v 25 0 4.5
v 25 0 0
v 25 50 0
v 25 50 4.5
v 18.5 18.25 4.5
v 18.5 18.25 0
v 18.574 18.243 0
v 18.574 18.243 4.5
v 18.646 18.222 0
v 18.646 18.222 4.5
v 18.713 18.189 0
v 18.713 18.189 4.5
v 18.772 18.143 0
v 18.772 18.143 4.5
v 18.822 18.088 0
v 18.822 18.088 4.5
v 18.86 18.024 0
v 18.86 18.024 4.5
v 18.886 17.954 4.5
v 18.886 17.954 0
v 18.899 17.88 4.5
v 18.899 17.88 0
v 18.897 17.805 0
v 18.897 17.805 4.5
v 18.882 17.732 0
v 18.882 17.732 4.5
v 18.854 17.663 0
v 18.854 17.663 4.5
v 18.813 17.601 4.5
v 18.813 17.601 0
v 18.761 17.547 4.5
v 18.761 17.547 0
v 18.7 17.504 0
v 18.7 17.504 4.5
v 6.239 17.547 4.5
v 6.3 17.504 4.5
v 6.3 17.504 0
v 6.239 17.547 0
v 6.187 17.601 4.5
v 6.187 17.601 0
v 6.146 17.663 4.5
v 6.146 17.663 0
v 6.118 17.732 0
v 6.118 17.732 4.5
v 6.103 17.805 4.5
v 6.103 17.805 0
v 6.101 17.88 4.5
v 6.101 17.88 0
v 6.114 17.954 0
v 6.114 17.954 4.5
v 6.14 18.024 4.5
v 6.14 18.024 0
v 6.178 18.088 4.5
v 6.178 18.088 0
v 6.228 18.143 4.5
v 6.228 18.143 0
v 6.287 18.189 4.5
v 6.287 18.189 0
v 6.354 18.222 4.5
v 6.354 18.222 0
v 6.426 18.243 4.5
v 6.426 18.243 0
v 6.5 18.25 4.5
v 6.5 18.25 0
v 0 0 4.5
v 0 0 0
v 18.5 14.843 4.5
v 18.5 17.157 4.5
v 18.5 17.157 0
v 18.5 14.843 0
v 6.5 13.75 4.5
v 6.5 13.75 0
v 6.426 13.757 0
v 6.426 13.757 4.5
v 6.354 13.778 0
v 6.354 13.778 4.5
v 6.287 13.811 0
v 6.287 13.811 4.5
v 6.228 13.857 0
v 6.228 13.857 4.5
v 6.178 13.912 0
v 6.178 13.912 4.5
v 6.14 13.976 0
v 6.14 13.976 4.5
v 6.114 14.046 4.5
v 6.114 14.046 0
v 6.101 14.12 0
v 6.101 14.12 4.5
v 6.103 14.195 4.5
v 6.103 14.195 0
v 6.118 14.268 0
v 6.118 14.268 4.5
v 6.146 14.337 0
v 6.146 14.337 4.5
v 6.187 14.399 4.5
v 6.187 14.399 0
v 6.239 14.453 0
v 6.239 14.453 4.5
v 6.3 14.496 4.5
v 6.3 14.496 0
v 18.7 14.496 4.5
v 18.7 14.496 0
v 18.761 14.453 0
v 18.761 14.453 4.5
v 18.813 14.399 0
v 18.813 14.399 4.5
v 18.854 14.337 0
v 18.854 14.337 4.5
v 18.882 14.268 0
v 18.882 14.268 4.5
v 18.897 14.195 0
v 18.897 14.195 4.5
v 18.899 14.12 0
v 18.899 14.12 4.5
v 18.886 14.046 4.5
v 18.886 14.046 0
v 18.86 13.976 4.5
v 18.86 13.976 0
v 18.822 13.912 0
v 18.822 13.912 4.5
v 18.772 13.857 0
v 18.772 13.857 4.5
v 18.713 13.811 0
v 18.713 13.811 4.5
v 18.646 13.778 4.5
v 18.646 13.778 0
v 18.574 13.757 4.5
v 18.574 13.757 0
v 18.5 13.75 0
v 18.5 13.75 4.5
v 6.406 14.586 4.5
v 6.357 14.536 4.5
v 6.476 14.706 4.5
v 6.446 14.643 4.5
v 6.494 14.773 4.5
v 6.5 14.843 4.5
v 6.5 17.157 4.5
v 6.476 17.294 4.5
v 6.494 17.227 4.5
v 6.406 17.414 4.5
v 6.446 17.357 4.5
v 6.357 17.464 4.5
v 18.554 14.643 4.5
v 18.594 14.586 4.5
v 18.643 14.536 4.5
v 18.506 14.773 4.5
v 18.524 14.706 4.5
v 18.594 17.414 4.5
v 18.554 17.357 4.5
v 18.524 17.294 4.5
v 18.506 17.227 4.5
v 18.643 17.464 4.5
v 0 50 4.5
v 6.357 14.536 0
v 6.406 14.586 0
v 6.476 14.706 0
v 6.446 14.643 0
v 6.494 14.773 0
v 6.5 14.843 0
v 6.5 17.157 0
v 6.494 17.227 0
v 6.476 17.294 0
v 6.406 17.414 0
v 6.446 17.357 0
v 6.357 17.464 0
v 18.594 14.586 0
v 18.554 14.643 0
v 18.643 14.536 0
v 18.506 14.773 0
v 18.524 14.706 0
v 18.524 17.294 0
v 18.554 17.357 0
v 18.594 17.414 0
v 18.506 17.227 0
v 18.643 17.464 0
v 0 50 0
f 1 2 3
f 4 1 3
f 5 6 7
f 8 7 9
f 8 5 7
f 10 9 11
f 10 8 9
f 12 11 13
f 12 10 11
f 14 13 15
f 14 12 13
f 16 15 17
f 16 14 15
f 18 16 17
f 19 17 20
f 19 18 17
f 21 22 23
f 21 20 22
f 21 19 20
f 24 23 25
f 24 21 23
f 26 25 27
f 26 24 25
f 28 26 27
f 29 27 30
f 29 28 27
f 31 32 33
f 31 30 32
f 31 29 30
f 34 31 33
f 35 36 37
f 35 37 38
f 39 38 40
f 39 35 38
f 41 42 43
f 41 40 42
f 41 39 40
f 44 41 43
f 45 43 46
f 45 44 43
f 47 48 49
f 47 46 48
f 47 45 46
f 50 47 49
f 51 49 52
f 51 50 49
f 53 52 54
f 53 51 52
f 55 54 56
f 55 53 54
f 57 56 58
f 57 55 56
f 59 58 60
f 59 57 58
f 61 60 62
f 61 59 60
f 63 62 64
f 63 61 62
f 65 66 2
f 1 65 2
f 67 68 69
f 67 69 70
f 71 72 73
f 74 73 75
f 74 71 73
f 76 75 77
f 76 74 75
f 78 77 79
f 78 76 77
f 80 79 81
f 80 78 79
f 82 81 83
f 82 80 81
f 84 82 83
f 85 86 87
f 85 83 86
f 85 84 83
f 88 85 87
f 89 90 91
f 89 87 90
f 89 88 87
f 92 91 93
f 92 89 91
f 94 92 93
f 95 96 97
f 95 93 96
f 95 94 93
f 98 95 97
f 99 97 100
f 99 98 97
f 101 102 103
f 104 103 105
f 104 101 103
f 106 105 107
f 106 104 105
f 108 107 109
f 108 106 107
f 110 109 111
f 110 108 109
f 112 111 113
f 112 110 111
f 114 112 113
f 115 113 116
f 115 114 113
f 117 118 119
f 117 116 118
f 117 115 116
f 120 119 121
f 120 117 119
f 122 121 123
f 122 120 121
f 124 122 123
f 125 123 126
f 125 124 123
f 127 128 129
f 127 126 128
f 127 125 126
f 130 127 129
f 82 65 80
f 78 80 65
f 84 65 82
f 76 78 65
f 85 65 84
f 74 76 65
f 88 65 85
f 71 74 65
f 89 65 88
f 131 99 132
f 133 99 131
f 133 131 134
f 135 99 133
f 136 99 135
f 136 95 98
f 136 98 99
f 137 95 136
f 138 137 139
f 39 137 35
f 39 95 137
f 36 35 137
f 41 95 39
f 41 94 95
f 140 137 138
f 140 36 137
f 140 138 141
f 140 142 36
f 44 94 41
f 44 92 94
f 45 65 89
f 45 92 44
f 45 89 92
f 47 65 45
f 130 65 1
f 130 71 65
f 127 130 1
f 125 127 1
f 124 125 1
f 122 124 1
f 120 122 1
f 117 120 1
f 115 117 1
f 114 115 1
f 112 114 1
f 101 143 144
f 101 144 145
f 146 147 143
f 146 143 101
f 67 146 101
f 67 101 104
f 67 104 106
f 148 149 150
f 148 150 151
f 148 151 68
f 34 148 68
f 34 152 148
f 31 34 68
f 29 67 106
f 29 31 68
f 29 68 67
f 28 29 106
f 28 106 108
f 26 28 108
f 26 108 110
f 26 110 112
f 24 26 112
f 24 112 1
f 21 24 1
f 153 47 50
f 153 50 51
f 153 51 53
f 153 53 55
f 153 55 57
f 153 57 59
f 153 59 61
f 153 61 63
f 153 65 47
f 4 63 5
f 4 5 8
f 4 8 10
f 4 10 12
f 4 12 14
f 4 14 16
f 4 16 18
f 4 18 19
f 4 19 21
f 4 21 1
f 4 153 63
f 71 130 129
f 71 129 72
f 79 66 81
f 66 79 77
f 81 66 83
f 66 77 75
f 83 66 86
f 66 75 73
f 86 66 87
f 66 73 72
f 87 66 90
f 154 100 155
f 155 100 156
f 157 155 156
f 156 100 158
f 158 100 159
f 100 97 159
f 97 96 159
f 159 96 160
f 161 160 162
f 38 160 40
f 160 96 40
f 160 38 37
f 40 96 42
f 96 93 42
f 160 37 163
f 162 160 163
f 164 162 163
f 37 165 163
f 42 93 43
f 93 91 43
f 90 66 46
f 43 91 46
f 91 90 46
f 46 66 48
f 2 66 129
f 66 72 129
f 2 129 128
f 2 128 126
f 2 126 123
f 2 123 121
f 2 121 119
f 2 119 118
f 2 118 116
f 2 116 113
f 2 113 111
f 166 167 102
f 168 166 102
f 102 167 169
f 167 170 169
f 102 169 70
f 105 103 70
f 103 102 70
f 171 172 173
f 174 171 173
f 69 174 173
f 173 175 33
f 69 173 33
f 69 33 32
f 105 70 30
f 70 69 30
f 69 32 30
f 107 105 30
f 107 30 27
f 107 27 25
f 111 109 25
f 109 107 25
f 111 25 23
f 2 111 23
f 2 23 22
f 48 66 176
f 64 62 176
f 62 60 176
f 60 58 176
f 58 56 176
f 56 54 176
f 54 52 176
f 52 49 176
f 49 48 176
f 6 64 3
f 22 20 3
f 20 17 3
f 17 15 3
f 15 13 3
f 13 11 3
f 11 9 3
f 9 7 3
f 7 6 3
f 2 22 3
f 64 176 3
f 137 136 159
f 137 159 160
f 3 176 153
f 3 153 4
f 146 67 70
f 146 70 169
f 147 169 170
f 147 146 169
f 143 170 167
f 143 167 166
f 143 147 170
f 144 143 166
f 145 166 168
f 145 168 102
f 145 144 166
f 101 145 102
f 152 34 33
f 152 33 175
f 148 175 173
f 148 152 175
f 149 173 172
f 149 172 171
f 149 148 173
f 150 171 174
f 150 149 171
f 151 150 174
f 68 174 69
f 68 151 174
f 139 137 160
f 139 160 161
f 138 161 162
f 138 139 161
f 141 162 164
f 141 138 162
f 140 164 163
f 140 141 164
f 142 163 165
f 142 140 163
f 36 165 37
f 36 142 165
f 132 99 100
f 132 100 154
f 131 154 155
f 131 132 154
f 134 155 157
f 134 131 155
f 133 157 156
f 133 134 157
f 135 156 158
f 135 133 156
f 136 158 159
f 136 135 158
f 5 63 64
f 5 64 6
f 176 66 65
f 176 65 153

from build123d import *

# Parameters (mm, degrees)
SKETCH1_W           = 25
SKETCH1_H           = 50
BOSS_EXTRUDE1_DEPTH = 4.5
CUT_EXTRUDE2_REACH  = 6.5


with BuildPart() as part:
    # Sketch1 → Boss-Extrude1 (new body)
    with BuildSketch(Plane.XY):
        with Locations((12.5, 25)):
            Rectangle(SKETCH1_W, SKETCH1_H)
    extrude(amount=BOSS_EXTRUDE1_DEPTH)

    # Sketch3 → Cut-Extrude2 (cut, up to next)
    with BuildSketch(Plane.XY.offset(4.5), mode=Mode.PRIVATE) as cut_extrude2_sk1:
        with BuildLine():
            Line((6.5, 18.25), (18.5, 18.25))
            ThreePointArc((18.5, 18.25), (18.886370331, 17.953527618), (18.7, 17.503589838))
            ThreePointArc((18.7, 17.503589838), (18.553589838, 17.357179677), (18.5, 17.157179677))
            Line((18.5, 17.157179677), (18.5, 14.842820323))
            ThreePointArc((18.5, 14.842820323), (18.553589838, 14.642820323), (18.7, 14.496410162))
            ThreePointArc((18.7, 14.496410162), (18.886370331, 14.046472382), (18.5, 13.75))
            Line((18.5, 13.75), (6.5, 13.75))
            ThreePointArc((6.5, 13.75), (6.113629669, 14.046472382), (6.3, 14.496410162))
            ThreePointArc((6.3, 14.496410162), (6.446410162, 14.642820323), (6.5, 14.842820323))
            Line((6.5, 14.842820323), (6.5, 17.157179677))
            ThreePointArc((6.5, 17.157179677), (6.446410162, 17.357179677), (6.3, 17.503589838))
            ThreePointArc((6.3, 17.503589838), (6.113629669, 17.953527618), (6.5, 18.25))
        make_face()
    cut_extrude2_tool1 = extrude(cut_extrude2_sk1.sketch, amount=-CUT_EXTRUDE2_REACH, mode=Mode.PRIVATE) & part.part
    add(cut_extrude2_tool1.solids().sort_by_distance((12.5, 16, 4.5))[0], mode=Mode.SUBTRACT)


solid = part.part
